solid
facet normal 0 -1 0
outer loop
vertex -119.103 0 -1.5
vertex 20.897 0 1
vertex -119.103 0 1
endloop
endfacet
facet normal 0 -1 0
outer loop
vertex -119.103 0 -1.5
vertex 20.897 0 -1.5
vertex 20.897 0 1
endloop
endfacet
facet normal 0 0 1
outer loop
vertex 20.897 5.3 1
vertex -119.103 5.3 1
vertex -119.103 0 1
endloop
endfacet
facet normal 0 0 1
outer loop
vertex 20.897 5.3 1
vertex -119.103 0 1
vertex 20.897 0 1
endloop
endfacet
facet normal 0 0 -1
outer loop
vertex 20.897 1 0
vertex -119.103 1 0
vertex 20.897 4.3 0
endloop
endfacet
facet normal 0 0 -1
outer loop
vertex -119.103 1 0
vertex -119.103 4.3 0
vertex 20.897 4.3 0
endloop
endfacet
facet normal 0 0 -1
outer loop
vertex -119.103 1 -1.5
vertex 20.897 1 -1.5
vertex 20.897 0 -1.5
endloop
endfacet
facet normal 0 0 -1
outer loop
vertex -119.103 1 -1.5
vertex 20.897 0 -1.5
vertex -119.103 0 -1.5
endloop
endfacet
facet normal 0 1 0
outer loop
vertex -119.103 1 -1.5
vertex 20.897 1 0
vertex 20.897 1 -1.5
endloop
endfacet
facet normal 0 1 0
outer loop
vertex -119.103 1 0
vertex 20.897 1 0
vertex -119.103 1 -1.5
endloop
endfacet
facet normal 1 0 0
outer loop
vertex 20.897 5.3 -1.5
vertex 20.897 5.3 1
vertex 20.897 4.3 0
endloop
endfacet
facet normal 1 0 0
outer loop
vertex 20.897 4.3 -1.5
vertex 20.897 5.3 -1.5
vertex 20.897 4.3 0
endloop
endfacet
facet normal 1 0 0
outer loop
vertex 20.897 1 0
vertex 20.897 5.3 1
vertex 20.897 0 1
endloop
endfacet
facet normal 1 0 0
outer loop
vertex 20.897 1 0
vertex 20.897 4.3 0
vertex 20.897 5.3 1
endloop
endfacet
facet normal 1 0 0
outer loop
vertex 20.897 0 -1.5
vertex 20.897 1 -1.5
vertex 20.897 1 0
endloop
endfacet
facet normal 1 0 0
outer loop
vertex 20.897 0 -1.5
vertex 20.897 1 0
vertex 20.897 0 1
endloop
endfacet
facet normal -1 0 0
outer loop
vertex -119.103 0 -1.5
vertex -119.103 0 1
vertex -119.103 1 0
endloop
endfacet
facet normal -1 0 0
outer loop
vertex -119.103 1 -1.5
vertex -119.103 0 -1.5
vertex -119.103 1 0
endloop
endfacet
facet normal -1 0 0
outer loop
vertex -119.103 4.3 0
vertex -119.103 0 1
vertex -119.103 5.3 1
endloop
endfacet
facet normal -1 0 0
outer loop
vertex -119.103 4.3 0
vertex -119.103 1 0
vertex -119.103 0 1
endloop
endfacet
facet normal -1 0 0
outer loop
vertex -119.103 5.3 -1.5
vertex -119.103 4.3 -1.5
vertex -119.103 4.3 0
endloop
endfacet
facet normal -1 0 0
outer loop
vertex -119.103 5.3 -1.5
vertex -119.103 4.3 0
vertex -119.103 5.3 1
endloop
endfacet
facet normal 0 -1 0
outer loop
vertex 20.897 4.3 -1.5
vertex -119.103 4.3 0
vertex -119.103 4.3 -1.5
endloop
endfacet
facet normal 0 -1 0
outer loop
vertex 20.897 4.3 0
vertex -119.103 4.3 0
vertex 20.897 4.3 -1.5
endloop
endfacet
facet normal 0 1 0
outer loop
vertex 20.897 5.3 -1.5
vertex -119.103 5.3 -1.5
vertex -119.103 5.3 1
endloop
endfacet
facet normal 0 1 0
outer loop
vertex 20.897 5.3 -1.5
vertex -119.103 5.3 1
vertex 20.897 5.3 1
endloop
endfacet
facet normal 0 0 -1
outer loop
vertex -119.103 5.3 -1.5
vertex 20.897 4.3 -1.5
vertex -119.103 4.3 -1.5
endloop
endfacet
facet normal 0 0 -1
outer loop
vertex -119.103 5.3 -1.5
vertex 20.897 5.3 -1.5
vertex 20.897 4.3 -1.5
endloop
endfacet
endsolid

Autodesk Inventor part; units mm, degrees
ref_plane "YZ Plane" through (0, 0, 0) normal (1, 0, 0) x (0, 1, 0)
ref_plane "XZ Plane" through (0, 0, 0) normal (0, 1, 0) x (-1, 0, 0)
ref_plane "XY Plane" through (0, 0, 0) normal (0, 0, 1) x (1, 0, 0)
sketch "Эскиз1" plane through (0, 0, 0) normal (0, 0, 1) x (1, 0, 0)
  line L0 (-119.1026, 5.3) -> (20.8974, 5.3)
  line L1 (20.8974, 5.3) -> (20.8974, 0)
  line L2 (20.8974, 0) -> (-119.1026, 0)
  line L3 (-119.1026, 0) -> (-119.1026, 5.3)
  point P0 (0, 0)
  point P1 (20.8974, 2.65)
  dimension "d0" = 5.3
  dimension "d1" = 140
extrude "Выдавливание1" add sketch "Эскиз1" along normal blind 1
sketch "Эскиз2" plane through (0, 0, 0) normal (0, 0, -1) x (-1, 0, 0)
  line L0 (-20.8974, 5.3) -> (119.1026, 5.3) projected
  line L1 (119.1026, 0) -> (-20.8974, 0) projected
  line L2 (119.1026, 5.3) -> (119.1026, 0) projected
  line L3 (-20.8974, 5.3) -> (119.1026, 5.3) projected
  line L4 (-20.8974, 0) -> (-20.8974, 5.3) projected
  line L5 (-20.8974, 0) -> (-20.8974, 5.3) projected
  line L6 (119.1026, 5.3) -> (119.1026, 0) projected
  line L7 (-20.8974, 5.3) -> (119.1026, 5.3)
  line L8 (119.1026, 5.3) -> (119.1026, 4.3)
  line L9 (119.1026, 4.3) -> (-20.8974, 4.3)
  line L10 (-20.8974, 4.3) -> (-20.8974, 5.3)
  line L11 (119.1026, 0) -> (-20.8974, 0)
  line L12 (-20.8974, 0) -> (-20.8974, 1)
  line L13 (-20.8974, 1) -> (119.1026, 1)
  line L14 (119.1026, 1) -> (119.1026, 0)
  point P0 (0, 0)
  dimension "d4" = 1
  dimension "d5" = 1
extrude "Выдавливание2" add sketch "Эскиз2" along normal blind 1.5 contours L0 L2 L9 L4 | L13 L2 L1 L4
properties part number "направляющая для стола"
